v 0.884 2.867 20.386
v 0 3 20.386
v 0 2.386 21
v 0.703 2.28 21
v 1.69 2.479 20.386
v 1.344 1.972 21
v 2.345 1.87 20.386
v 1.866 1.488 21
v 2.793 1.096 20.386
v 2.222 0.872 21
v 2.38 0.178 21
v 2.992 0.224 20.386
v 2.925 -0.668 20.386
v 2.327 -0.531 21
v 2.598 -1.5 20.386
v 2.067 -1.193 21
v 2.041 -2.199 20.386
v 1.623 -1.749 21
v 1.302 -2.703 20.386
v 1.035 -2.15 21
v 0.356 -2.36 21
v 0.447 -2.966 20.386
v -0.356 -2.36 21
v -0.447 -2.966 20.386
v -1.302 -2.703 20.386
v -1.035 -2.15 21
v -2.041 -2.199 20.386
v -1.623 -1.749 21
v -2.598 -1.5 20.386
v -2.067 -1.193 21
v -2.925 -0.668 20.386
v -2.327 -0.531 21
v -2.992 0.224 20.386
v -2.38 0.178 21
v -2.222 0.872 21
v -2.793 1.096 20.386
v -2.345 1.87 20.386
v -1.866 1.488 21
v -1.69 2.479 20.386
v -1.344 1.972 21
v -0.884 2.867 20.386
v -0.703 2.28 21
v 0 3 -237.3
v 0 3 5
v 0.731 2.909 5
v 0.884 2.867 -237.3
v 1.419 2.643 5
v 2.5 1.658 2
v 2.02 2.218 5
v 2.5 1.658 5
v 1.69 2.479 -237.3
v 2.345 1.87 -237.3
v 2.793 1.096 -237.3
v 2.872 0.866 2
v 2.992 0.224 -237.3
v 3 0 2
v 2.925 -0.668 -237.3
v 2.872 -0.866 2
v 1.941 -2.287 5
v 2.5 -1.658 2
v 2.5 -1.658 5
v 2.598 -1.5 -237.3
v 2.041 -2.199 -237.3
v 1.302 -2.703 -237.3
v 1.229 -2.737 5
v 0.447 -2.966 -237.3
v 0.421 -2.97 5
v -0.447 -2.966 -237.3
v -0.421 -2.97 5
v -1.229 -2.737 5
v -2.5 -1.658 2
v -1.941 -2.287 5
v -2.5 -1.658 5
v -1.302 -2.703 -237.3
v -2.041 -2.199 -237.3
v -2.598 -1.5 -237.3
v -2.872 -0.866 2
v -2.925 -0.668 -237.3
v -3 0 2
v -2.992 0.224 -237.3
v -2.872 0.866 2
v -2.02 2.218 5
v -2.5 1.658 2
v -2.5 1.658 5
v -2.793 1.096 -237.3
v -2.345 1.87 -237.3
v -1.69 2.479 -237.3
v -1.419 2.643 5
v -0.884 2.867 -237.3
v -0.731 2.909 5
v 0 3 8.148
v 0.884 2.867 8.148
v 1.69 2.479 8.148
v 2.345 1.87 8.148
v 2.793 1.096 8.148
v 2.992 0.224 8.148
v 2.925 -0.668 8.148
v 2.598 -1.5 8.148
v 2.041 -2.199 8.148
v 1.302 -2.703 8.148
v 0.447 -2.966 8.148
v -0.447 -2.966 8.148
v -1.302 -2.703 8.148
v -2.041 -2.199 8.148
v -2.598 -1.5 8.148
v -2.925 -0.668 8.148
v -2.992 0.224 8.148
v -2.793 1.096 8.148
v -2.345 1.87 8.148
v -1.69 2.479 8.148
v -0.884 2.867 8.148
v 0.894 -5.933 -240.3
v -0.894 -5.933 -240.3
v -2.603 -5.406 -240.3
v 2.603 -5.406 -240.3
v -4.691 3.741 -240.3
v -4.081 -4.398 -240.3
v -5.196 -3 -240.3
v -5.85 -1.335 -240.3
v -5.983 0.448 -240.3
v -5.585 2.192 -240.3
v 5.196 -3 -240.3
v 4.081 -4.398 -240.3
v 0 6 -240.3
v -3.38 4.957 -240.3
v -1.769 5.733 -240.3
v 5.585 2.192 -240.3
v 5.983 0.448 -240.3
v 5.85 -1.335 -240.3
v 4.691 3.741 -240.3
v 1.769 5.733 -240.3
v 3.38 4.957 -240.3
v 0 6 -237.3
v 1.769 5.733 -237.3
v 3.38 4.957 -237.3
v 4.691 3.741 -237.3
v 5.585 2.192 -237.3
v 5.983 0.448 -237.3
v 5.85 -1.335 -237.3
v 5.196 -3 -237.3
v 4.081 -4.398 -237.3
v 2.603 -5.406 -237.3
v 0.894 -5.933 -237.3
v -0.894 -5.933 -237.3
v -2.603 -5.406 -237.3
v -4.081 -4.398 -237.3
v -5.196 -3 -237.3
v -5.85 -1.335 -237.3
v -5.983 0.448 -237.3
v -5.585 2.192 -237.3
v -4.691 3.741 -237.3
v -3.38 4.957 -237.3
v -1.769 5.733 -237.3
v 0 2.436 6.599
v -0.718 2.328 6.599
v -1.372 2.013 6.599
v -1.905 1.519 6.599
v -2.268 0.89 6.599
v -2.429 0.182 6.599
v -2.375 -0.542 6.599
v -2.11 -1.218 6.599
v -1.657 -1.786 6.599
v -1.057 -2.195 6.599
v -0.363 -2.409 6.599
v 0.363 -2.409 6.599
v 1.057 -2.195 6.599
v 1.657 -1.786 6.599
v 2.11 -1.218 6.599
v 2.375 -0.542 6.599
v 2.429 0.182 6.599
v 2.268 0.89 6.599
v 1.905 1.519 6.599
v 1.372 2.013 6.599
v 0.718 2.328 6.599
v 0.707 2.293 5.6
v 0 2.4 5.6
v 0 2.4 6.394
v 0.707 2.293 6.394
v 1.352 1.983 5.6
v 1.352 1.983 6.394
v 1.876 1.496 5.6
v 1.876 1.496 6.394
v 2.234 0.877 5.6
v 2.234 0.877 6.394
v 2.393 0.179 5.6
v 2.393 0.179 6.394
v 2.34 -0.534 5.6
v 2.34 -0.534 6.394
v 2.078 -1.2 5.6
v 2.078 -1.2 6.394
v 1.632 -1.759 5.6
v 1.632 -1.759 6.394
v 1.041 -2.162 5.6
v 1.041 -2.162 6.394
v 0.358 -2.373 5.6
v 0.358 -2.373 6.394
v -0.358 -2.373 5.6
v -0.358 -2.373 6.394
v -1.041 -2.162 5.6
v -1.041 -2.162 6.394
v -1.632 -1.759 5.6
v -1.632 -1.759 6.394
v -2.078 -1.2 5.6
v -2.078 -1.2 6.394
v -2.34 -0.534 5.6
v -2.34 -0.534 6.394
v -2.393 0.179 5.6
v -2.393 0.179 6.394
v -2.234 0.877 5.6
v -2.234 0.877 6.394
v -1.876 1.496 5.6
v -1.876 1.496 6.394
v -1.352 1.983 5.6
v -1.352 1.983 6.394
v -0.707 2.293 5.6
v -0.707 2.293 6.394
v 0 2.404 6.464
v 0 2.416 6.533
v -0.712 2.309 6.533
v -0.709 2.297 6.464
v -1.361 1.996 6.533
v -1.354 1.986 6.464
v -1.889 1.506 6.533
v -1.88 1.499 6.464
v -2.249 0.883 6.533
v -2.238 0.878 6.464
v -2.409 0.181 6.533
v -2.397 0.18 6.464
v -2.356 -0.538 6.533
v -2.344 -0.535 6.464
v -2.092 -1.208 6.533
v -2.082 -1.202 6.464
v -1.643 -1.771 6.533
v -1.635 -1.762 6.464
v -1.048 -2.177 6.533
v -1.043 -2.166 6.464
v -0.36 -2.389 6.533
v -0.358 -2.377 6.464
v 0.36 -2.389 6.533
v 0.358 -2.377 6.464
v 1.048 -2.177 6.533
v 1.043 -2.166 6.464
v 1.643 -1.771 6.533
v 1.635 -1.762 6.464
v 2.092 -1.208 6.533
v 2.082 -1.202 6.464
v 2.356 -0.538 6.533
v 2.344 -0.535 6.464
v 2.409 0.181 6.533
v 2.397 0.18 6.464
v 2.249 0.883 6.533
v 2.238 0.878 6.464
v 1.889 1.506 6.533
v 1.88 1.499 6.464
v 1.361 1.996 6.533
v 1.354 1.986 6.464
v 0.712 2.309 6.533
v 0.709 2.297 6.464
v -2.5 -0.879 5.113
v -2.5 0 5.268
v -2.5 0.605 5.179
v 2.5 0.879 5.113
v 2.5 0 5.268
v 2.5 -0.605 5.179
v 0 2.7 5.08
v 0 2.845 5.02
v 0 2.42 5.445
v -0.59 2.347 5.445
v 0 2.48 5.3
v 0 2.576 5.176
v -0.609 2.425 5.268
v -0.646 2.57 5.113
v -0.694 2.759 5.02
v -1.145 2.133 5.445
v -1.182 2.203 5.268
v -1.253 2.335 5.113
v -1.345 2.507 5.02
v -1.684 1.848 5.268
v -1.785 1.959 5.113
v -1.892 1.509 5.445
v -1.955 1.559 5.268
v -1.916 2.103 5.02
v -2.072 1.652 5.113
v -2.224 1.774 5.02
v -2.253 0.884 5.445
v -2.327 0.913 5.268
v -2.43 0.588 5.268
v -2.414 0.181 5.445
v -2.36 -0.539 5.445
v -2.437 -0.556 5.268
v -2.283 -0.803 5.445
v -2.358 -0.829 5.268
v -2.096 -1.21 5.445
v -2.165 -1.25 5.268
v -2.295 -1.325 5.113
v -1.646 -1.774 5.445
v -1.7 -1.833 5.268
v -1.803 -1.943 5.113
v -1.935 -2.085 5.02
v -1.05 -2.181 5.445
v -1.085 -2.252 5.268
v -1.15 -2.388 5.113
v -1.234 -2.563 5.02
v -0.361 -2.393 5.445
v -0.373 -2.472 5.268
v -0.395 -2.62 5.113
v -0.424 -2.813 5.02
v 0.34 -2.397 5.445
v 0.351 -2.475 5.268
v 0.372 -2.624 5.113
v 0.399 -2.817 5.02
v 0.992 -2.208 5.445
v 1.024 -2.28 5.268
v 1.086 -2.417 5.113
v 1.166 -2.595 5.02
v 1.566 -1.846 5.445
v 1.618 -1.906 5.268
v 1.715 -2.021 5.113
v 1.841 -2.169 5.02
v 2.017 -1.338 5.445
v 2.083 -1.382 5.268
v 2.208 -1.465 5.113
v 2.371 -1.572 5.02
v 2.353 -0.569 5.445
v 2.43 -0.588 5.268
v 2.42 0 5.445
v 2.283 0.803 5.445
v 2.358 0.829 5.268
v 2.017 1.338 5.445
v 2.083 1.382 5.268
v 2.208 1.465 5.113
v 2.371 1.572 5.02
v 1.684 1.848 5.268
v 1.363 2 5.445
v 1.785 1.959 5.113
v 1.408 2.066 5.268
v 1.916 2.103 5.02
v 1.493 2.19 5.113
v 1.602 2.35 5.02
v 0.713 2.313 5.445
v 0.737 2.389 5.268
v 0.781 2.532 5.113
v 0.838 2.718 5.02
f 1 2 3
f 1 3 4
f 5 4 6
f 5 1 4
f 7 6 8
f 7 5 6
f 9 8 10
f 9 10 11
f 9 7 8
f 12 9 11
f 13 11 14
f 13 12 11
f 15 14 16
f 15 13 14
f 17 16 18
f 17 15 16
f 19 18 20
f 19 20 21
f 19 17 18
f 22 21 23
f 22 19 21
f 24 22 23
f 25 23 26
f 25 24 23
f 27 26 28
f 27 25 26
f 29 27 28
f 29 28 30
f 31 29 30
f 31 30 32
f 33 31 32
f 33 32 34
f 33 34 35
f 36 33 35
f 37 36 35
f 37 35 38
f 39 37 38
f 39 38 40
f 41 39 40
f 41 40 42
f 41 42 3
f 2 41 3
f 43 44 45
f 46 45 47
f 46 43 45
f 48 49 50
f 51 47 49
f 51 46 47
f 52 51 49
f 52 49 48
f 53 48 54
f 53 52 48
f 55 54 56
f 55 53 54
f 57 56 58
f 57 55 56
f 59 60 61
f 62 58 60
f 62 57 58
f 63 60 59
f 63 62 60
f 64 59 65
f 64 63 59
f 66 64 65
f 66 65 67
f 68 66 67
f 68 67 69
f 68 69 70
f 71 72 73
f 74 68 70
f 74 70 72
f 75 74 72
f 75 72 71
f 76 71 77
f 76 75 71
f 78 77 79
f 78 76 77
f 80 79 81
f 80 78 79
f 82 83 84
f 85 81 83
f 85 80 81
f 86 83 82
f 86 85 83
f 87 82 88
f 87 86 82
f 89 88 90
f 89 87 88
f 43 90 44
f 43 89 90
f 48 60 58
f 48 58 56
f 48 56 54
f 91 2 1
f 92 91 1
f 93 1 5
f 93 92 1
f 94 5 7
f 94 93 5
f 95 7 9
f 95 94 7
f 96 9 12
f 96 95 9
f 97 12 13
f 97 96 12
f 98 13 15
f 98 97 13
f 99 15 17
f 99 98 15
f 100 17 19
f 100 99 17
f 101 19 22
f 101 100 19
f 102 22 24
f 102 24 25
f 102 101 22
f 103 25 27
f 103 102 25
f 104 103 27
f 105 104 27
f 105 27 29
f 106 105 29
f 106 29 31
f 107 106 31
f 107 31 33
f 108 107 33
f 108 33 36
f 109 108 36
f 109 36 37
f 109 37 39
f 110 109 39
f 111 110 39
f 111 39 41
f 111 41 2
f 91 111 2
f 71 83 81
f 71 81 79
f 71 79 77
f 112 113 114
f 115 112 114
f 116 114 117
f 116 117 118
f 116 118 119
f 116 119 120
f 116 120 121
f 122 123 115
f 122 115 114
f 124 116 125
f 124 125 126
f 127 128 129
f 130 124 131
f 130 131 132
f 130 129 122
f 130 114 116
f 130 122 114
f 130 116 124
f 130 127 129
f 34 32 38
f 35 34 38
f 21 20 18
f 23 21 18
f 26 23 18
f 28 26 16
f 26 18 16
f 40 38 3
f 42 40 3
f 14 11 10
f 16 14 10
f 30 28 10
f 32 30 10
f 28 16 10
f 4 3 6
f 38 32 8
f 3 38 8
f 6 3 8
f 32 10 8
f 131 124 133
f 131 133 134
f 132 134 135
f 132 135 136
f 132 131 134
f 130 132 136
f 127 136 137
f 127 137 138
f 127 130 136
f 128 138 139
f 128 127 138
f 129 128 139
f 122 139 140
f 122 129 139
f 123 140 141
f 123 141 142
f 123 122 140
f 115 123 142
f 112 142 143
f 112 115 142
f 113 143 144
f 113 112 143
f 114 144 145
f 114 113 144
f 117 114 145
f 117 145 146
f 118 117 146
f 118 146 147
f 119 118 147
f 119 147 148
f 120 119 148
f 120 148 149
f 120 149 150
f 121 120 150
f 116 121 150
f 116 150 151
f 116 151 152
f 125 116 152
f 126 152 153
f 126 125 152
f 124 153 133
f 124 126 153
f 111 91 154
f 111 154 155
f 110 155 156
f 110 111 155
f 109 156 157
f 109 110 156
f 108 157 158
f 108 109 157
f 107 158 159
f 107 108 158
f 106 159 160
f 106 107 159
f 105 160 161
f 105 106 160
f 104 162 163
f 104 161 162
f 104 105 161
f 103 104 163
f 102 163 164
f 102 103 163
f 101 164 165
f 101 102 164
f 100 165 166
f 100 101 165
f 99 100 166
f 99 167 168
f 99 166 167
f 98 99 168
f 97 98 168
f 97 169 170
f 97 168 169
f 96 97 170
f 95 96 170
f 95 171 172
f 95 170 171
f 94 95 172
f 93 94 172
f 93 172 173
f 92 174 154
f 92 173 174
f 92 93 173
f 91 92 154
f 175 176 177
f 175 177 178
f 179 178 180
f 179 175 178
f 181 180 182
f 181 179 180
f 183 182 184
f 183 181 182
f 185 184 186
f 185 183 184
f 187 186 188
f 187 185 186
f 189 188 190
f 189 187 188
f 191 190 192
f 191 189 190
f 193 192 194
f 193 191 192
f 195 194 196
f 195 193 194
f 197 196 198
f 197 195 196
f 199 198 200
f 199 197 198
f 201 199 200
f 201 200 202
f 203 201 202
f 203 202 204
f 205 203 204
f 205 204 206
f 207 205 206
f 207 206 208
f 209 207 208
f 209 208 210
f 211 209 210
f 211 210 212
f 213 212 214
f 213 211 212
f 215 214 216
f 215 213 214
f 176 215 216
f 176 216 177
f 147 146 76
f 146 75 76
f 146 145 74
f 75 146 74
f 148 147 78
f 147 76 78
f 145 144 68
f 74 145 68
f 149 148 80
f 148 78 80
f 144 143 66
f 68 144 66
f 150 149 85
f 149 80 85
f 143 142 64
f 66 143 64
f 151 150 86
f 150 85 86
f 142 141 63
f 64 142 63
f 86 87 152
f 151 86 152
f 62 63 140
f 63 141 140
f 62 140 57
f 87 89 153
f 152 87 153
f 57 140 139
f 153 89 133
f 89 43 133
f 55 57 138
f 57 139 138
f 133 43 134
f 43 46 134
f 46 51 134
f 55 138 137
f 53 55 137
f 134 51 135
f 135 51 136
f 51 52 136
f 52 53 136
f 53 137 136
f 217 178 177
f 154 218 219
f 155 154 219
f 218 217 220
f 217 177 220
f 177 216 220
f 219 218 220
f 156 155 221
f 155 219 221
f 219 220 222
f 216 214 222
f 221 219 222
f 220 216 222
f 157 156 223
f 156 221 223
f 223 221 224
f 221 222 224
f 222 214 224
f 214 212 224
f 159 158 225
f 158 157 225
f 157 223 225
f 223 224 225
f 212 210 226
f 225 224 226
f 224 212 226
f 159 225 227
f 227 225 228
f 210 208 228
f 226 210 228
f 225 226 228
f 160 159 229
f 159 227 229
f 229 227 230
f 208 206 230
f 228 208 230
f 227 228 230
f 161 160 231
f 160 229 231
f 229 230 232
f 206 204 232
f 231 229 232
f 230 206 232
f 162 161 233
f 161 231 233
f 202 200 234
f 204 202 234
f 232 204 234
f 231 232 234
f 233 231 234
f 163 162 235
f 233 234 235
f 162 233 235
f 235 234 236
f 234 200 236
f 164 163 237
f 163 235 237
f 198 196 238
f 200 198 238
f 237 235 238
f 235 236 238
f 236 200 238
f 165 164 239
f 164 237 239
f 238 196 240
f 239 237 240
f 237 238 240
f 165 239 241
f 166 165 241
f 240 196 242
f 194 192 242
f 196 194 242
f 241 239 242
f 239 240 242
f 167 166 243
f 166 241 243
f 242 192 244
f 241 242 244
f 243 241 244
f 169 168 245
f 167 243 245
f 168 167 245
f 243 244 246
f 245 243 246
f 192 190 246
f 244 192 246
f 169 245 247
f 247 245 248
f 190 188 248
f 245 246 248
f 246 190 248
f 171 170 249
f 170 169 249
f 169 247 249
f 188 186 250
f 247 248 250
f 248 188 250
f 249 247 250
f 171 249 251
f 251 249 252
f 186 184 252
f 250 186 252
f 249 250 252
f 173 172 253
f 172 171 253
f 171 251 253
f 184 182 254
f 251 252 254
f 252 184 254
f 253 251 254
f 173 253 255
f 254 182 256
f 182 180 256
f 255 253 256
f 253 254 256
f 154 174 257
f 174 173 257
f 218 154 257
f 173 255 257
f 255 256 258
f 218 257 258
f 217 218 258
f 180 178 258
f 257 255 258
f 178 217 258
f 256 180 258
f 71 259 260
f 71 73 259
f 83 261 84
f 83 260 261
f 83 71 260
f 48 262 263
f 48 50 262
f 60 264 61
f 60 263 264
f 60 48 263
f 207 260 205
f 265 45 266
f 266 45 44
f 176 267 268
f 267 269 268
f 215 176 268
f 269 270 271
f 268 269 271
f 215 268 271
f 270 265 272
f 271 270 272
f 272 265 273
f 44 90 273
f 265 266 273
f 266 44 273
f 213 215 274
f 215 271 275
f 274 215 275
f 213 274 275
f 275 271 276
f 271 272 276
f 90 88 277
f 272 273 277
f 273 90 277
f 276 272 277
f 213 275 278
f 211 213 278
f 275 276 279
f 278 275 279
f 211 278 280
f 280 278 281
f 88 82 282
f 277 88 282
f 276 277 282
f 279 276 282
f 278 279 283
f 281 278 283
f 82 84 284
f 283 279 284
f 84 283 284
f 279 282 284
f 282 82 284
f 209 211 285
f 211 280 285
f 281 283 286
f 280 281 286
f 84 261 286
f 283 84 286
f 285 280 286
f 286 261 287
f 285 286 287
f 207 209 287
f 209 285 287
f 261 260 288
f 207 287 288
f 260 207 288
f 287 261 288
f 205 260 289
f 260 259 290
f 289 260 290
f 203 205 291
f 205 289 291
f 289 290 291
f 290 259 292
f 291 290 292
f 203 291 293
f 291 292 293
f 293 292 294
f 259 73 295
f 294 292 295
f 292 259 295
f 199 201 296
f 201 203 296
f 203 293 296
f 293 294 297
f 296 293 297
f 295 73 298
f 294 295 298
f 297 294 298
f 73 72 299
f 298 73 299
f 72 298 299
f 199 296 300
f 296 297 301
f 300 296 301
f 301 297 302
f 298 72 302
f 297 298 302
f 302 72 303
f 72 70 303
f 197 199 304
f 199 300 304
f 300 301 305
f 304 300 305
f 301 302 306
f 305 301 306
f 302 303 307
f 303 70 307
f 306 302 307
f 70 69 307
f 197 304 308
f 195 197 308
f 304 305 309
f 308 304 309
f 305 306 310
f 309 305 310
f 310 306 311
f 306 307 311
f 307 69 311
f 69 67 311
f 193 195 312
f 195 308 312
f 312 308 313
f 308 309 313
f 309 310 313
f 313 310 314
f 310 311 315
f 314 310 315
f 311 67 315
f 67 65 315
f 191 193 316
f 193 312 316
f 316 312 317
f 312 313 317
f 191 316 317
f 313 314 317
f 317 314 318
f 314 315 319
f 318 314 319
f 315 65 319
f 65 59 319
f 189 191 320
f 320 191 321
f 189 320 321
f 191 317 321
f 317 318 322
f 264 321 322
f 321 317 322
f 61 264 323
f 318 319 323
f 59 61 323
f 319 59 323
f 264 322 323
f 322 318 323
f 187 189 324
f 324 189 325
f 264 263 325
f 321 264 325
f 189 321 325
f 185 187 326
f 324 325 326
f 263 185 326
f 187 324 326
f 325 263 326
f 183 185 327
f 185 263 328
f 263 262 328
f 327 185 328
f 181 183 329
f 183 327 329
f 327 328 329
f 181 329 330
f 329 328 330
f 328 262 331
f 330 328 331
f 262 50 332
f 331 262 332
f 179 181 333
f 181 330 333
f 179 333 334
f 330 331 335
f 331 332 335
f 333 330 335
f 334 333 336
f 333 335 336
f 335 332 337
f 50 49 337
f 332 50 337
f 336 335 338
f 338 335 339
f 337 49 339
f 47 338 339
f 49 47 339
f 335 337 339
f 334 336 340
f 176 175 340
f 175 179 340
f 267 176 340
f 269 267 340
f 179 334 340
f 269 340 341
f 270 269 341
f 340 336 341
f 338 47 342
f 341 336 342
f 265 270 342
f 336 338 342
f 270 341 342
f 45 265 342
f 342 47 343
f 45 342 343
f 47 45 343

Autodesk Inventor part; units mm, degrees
sketch "Sketch_2" plane through (0, 0, 0) normal (1, 0, 0) x (0, 1, 0)
  line L0 (0, -240.3) -> (0, 5)
  line L1 (0, 5) -> (3, 5)
  line L2 (3, 5) -> (3, -237.3)
  line L3 (3, -237.3) -> (6, -237.3)
  line L4 (6, -237.3) -> (6, -240.3)
  line L5 (6, -240.3) -> (0, -240.3)
  line L6 (0, -240.3) -> (0, 5)
revolve "Revolution1" add sketch "Sketch_2" angle 360 about axis through (0, 0, -240.3) along (0, 0, -1)
sketch "Sketch_6" plane through (0, 0, 0) normal (1, 0, 0) x (0, 1, 0)
  line L0 (0, 4) -> (0, 21)
  line L1 (0, 21) -> (2.3865, 21)
  line L2 (2.3865, 21) -> (3, 20.3865)
  line L3 (3, 20.3865) -> (3, 8.1485)
  line L4 (3, 8.1485) -> (2.4362, 6.5994)
  arc A0 (2.4362, 6.5994) -> (2.4, 6.3942) centre (3, 6.3942) ccw
  line L5 (2.4, 6.3942) -> (2.4, 5.6)
  arc A1 (2.4, 5.6) -> (3, 5) centre (3, 5.6) ccw
  line L6 (3, 5) -> (3, 4)
  line L7 (3, 4) -> (0, 4)
  line L8 (0, 4) -> (0, 21)
revolve "Revolution2" add sketch "Sketch_6" angle 360 about axis through (0, 0, 4) along (0, 0, -1)
thread "Thread1" size "M6x1" class "6g" standard "ISO Metric profile" full length
sketch "Sketch_7" plane through (0, 0, 2) normal (0, 0, 1) x (1, 0, 0)
  line L0 (-5, 10) -> (-5, -5)
  line L1 (-5, -5) -> (-2.5, -5)
  line L2 (-2.5, -5) -> (-2.5, 5)
  line L3 (-2.5, 5) -> (2.5, 5)
  line L4 (2.5, 5) -> (2.5, -5)
  line L5 (2.5, -5) -> (5, -5)
  line L6 (5, -5) -> (5, 10)
  line L7 (5, 10) -> (-5, 10)
extrude "Extrusion1" cut sketch "Sketch_7" along normal blind 4
ref_plane "FDT_KSAUFSATZ_XY" through (0, 0, 11.2) normal (0, 0, 1) x (-1, 0, 0)
ref_plane "FDT_KSAUFSATZ_YZ" through (0, 0, 11.2) normal (-1, 0, 0) x (0, -1, 0)
ref_plane "FDT_KSAUFSATZ_ZX" through (0, 0, 11.2) normal (0, -1, 0) x (0, 0, 1)
ref_plane "FDT_NUT_XY" through (0, 0, 11.2) normal (0, 0, 1) x (-1, 0, 0)
ref_plane "FDT_NUT_YZ" through (0, 0, 11.2) normal (-1, 0, 0) x (0, -1, 0)
ref_plane "FDT_NUT_ZX" through (0, 0, 11.2) normal (0, -1, 0) x (0, 0, 1)
ref_plane "KS_XY" through (0, 0, 0) normal (0, 0, -1) x (1, 0, 0)
ref_plane "KS_YZ" through (0, 0, 0) normal (1, 0, 0) x (0, -1, 0)
ref_plane "KS_ZX" through (0, 0, 0) normal (0, -1, 0) x (0, 0, -1)
ref_plane "NUT1_XY" through (0, 0, 16) normal (0, 0, 1) x (1, 0, 0)
ref_plane "NUT1_YZ" through (0, 0, 16) normal (1, 0, 0) x (0, 1, 0)
ref_plane "NUT1_ZX" through (0, 0, 16) normal (0, 1, 0) x (0, 0, 1)
properties part number "19197 DSNU-12-200-P---(A---00--0-KS)"
